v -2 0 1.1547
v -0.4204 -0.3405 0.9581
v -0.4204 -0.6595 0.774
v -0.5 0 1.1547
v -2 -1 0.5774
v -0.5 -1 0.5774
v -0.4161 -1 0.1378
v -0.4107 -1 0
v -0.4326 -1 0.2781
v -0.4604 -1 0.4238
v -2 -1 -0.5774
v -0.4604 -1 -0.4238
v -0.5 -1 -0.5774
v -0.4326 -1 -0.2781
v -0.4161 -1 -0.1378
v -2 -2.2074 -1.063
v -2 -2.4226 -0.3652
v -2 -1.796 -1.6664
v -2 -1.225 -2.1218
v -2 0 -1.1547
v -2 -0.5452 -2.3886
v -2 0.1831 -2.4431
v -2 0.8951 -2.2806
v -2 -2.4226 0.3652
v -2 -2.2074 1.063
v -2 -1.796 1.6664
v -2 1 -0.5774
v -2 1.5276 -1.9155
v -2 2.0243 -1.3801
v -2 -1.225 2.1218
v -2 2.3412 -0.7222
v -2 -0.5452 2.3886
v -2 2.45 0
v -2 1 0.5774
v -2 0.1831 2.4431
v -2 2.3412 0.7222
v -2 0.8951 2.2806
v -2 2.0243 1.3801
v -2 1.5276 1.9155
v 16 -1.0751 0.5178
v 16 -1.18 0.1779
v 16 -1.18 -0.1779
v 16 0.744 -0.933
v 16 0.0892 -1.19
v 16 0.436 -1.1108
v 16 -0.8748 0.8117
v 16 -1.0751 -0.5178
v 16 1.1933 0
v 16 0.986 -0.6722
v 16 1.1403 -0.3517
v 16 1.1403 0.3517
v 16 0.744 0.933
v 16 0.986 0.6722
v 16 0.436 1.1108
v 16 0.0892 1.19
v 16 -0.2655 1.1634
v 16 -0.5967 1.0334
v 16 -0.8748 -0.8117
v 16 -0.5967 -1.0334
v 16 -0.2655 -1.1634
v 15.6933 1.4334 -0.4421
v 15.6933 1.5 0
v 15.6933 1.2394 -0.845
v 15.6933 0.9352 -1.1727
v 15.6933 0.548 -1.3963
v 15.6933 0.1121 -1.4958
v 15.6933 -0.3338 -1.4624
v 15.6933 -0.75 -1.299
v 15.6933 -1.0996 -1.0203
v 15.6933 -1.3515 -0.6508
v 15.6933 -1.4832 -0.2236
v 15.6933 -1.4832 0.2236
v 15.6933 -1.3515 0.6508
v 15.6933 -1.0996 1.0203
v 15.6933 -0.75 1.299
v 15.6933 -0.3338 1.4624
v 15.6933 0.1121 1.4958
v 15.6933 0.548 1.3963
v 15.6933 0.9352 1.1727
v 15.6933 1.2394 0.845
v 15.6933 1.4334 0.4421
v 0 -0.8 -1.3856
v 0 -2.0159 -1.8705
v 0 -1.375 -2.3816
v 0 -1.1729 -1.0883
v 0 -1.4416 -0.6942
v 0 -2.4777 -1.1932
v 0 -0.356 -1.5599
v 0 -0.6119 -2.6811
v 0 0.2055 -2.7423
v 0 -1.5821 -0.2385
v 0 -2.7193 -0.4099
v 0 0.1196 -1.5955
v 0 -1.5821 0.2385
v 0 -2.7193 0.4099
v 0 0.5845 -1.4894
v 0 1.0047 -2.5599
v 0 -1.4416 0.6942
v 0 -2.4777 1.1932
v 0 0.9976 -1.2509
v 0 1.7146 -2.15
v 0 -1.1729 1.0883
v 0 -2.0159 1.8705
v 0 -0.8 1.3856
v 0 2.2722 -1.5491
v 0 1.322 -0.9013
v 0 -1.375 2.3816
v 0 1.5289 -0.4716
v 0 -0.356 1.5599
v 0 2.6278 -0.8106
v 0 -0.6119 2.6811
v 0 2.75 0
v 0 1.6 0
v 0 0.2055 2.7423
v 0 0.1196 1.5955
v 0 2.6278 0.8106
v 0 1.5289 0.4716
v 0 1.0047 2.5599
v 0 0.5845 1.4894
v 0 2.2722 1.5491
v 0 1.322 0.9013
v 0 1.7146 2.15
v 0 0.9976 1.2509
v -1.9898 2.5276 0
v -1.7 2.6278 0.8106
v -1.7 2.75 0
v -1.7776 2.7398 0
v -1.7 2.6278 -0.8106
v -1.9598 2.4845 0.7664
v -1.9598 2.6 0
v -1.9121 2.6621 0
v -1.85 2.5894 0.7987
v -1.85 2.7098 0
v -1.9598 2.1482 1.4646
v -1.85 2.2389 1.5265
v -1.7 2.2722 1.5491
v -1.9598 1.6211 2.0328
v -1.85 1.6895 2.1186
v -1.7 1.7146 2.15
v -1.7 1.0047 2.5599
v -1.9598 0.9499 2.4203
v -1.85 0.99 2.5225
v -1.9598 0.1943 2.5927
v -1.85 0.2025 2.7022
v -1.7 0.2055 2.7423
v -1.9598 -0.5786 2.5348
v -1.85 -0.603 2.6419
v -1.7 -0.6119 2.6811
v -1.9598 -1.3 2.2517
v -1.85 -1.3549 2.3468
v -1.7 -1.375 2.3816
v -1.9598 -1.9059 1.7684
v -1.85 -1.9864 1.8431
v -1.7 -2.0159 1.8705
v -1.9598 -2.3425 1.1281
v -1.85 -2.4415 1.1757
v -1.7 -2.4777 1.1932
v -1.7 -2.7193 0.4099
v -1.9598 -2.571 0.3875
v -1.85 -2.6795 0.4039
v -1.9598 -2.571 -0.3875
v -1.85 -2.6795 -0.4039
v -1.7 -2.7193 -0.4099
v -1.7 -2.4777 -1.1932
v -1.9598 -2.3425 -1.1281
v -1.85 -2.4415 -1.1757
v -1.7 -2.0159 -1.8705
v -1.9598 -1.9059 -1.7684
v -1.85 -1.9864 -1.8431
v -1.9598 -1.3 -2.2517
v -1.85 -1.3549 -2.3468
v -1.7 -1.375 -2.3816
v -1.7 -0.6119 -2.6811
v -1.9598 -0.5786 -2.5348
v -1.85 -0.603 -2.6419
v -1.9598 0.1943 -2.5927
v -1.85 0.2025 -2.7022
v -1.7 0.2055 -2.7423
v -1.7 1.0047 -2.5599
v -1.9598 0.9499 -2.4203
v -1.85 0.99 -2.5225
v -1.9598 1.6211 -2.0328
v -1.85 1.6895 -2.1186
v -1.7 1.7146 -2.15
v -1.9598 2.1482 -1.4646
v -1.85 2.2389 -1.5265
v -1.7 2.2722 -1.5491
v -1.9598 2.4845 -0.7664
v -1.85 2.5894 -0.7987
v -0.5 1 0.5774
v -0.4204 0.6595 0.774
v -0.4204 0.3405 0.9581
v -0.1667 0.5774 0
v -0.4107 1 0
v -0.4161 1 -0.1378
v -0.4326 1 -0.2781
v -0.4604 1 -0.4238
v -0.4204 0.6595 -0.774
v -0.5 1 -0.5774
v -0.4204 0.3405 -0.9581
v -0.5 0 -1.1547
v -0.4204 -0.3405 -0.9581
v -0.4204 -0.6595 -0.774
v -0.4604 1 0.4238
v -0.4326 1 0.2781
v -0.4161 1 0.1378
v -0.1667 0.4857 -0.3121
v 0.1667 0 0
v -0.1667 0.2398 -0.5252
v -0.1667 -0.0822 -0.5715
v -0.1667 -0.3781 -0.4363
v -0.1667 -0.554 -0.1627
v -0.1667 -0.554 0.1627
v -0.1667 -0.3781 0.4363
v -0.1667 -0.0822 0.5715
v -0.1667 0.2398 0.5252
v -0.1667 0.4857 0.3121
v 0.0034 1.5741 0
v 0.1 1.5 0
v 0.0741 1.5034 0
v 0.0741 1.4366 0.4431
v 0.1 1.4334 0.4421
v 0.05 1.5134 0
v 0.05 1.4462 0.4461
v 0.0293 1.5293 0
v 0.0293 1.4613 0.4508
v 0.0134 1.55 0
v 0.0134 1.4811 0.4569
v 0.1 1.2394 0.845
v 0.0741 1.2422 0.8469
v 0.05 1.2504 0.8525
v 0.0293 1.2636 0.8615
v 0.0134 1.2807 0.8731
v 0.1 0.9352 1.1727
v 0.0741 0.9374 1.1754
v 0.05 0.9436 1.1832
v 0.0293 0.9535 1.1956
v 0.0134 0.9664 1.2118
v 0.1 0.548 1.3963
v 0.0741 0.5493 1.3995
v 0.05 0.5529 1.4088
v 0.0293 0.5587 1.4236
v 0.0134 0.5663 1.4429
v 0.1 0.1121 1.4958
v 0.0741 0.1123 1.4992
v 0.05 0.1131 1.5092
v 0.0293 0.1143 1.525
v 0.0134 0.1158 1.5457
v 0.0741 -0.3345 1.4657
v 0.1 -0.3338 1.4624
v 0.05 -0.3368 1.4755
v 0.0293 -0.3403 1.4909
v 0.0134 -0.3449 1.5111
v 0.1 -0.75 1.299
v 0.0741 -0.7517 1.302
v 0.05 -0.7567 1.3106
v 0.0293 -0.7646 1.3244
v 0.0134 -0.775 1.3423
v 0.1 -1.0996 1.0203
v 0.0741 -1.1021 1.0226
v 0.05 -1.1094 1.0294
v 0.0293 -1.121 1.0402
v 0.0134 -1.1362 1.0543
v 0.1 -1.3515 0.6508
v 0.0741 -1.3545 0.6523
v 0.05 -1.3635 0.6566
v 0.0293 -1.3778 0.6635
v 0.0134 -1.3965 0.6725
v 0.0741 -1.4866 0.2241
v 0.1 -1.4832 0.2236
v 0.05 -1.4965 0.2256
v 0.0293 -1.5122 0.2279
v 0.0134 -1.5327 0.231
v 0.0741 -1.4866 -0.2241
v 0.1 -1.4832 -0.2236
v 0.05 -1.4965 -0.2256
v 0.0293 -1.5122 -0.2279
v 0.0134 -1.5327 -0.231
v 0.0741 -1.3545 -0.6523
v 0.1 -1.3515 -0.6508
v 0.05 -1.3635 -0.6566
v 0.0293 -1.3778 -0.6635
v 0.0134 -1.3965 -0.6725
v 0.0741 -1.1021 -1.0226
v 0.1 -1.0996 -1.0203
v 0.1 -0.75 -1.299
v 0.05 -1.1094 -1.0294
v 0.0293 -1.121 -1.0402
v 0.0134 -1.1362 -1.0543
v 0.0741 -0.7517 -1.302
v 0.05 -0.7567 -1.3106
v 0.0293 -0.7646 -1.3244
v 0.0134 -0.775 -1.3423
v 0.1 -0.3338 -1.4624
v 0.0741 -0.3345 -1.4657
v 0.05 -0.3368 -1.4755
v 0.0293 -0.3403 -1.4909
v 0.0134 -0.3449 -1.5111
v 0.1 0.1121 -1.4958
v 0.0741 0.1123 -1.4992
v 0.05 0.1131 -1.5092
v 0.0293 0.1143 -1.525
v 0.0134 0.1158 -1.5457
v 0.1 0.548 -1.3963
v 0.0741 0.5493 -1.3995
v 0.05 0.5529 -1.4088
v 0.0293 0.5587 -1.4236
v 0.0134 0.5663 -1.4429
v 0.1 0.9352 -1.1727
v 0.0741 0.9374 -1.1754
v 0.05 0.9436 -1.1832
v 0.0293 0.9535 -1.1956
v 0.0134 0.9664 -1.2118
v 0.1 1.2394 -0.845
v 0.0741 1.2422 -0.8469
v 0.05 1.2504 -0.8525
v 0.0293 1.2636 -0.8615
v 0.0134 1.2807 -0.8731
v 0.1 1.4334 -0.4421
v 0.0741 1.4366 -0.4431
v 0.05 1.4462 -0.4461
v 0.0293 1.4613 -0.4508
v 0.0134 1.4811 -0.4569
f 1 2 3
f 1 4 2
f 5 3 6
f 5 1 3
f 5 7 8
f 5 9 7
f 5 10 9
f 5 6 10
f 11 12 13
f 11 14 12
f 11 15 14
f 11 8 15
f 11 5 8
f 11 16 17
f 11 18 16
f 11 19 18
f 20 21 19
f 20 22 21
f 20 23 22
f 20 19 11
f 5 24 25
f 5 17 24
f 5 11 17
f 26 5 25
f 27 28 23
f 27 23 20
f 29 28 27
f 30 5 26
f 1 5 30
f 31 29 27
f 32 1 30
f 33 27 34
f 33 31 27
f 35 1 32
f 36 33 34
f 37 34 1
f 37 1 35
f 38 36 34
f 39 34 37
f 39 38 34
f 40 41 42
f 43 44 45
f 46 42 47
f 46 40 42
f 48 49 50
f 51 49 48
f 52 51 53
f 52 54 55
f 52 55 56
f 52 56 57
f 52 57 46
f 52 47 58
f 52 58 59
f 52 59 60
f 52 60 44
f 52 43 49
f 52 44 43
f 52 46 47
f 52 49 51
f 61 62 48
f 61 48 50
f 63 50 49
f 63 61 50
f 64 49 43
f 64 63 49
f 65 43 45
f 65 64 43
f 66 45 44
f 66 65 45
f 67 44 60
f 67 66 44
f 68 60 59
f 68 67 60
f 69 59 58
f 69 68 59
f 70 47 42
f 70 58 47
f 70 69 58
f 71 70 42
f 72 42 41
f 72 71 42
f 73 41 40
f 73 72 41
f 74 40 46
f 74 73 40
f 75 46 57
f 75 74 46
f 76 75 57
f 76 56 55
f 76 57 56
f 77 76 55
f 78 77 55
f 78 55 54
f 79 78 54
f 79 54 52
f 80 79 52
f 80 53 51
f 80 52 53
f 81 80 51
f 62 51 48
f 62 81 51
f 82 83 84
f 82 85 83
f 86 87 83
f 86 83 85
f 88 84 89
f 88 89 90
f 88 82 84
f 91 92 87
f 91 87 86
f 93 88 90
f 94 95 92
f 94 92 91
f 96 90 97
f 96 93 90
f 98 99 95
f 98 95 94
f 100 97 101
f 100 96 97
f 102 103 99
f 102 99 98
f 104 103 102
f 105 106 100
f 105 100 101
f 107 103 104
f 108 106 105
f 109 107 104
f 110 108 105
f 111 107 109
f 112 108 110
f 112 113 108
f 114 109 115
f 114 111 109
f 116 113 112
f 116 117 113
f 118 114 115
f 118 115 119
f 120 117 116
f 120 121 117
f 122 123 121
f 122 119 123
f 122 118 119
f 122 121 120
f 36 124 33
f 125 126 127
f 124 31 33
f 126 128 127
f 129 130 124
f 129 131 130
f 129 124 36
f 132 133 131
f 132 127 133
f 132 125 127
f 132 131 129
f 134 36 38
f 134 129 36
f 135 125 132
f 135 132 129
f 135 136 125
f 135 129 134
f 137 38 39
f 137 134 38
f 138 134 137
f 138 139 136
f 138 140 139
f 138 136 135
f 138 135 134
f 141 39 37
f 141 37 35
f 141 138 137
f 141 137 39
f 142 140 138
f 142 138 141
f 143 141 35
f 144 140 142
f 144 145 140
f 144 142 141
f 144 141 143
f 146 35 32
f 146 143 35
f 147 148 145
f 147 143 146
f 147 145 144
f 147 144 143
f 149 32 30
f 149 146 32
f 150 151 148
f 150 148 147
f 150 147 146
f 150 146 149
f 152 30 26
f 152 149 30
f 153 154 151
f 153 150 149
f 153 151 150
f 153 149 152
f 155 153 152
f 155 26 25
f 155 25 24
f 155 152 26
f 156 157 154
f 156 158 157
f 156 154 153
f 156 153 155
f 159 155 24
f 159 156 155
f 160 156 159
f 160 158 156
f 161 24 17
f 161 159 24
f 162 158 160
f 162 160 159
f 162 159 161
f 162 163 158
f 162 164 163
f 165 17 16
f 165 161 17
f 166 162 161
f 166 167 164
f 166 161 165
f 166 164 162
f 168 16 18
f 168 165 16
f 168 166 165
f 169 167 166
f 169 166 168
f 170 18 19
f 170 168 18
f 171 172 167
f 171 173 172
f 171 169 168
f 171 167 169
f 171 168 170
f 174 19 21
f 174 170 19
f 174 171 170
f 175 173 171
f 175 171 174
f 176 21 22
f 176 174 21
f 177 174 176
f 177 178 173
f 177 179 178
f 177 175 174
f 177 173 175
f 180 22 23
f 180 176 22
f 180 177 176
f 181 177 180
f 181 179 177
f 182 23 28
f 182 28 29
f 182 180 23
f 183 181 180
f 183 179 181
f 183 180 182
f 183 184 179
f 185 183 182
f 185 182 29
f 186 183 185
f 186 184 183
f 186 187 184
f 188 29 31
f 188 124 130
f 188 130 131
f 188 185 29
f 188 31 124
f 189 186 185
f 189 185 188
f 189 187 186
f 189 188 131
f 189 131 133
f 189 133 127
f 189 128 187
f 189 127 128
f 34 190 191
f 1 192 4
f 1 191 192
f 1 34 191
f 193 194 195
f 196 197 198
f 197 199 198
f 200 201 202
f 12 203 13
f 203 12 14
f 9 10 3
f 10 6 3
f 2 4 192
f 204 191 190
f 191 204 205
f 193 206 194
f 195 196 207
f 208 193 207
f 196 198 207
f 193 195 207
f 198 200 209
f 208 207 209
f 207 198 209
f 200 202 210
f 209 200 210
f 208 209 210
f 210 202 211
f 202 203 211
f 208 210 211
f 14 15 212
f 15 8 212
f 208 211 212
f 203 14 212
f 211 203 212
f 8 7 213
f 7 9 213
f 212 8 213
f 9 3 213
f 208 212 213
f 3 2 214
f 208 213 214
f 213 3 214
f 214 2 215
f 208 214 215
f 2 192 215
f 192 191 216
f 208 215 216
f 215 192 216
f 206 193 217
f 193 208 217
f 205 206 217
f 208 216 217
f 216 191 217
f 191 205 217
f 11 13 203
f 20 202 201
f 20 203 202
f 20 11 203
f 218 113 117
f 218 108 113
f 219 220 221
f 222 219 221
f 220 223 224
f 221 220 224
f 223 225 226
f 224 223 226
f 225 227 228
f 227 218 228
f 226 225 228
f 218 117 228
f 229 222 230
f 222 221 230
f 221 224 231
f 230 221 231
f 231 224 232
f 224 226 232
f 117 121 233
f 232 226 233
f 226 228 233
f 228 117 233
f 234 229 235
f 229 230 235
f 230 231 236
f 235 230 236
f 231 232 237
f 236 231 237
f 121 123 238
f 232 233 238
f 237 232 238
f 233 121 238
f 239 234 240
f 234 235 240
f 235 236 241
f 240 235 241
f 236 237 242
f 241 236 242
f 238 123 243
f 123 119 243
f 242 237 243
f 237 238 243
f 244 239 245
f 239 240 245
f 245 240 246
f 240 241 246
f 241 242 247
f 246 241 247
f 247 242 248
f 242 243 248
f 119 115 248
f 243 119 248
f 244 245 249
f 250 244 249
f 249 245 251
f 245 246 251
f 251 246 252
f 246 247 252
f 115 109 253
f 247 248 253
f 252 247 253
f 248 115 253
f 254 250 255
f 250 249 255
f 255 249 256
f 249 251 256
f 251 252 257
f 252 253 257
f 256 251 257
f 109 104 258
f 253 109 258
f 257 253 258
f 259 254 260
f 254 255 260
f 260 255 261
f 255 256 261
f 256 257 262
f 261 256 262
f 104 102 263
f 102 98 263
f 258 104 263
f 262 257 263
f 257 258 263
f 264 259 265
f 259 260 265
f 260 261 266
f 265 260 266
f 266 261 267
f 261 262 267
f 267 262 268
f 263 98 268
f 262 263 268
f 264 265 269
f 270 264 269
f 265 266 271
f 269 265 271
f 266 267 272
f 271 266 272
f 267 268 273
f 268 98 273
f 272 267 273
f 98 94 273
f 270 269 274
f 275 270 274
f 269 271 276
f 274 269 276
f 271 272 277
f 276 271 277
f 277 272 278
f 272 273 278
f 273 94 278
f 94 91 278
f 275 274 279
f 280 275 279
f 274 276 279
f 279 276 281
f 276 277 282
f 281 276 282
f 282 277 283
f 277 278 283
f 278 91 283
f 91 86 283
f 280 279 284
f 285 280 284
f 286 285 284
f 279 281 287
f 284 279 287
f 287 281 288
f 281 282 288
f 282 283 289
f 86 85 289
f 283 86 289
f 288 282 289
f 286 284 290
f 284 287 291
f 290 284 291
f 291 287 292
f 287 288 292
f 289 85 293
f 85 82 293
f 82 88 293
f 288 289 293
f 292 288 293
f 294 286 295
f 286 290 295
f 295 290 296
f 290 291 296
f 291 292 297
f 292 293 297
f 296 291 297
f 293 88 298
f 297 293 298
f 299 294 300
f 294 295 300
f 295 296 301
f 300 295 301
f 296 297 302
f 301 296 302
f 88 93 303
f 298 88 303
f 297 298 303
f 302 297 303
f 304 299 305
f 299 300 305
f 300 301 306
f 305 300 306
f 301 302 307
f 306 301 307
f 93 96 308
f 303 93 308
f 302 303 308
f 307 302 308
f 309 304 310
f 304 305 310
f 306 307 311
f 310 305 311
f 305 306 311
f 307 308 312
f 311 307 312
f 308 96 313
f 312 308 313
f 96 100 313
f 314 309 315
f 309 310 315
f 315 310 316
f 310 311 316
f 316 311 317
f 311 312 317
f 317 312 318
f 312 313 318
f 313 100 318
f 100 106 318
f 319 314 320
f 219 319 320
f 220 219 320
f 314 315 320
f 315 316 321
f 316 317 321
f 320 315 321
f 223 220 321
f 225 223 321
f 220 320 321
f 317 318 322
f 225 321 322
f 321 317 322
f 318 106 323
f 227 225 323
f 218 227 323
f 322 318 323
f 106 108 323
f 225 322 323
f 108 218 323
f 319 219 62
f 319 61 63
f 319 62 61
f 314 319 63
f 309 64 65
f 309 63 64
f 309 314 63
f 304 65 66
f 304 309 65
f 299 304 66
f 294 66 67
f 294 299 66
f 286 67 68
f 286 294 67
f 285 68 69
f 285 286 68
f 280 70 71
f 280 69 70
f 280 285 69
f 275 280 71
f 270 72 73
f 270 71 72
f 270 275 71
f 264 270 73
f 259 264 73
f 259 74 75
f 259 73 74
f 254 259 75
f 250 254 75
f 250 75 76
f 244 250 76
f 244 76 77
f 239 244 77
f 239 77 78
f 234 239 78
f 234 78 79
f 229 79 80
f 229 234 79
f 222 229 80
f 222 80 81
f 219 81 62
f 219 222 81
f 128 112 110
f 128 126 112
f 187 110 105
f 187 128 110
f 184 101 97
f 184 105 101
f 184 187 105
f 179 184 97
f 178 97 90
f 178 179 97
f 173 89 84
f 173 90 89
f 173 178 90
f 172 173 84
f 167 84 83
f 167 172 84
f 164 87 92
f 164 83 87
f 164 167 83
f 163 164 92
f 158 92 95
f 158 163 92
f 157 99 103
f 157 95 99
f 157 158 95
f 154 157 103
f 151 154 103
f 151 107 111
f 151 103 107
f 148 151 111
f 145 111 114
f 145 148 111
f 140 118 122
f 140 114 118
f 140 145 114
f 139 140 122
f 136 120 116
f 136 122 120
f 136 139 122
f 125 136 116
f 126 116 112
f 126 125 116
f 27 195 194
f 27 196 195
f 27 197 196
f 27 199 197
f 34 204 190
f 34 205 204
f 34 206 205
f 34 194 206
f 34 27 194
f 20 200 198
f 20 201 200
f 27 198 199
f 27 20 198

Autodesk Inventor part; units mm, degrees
ref_plane "YZ Plane" through (0, 0, 0) normal (1, 0, 0) x (0, 1, 0)
ref_plane "XZ Plane" through (0, 0, 0) normal (0, 1, 0) x (-1, 0, 0)
sketch "Skizze1" plane through (0, 0, 0) normal (0, 0, 1) x (1, 0, 0)
  line L0 (0.1667, 0) -> (16, 0)
  line L1 (16, 0) -> (16, 1.5)
  line L2 (16, 1.5) -> (1.5, 1.5)
  line L3 (1.5, 1.5) -> (1.1932, 1.5)
  line L4 (1.1932, 1.5) -> (0, 1.5)
  line L5 (0, 1.5) -> (0, 2.75)
  line L6 (0, 2.75) -> (-2, 2.75)
  line L7 (-2, 2.75) -> (-2, 1.1547)
  line L8 (-2, 1.1547) -> (-0.5, 1.1547)
  line L9 (-0.5, 1.1547) -> (0.1667, 0)
  line L10 (-5.6, 0) -> (19.6, 0) projected
  line L11 (0, -0.55) -> (0, 3.3) projected
  line L12 (1.5, 1.5) -> (0, 1.5) construction
  dimension "d1" = 14.5
  dimension "d2" = 0.3068
  dimension "d3" = 2
  dimension "d4" = 1.5
  dimension "d5" = 60
  dimension "d6" = 3
  dimension "d7" = 3
  dimension "d8" = 2.3094
  dimension "d9" = 5.5
  dimension "d26" = 16
revolve "Körper" add sketch "Skizze1" angle 360 about axis through (0.1667, 0, 0) along (1, 0, 0) contours L9 L11 L4 L3 L2 L1 L0 | L9 L8 L7 L6 L5 L11
sketch "Skizze2" plane through (-2, 0, 0) normal (-1, 0, 0) x (0, 0, 1)
  circle A0 centre (0, 0) radius 1.1547 projected
  line L0 (0, -3.85) -> (0, 3.85) projected
  line L1 (-3.85, 0) -> (3.85, 0) projected
  line L2 (1.1547, 0) -> (0.5774, -1)
  line L3 (0.5774, -1) -> (-0.5774, -1)
  line L4 (-0.5774, -1) -> (-1.1547, 0)
  line L5 (-1.1547, 0) -> (-0.5774, 1)
  line L6 (-0.5774, 1) -> (0.5774, 1)
  line L7 (0.5774, 1) -> (1.1547, 0)
  point P0 (0, 0)
extrude "Loch" add sketch "Skizze2" against normal up to next contours L7 A0 | A0 L2 | L6 L0 A0 | A0 L0 L3 | L0 L6 A0 | A0 L3 L0 | L4 A0 | A0 L5
fillet "Rundung1" radius 0.3 1 edges at (-2, -2.75, 0)
thread "Gewinde" size "M3x0.5" class "6g" standard "ISO Metric profile" length 14.5
chamfer "Fase1" distance 0.3067 distance2 0.3067 1 edges at (16, -1.5, 0) measured on face at (16, -0.4645, -0.4115)
ref_plane "Work Plane1" through (29, 0, 0) normal (0, -1, 0) x (1, 0, 0)
fillet "Fillet2" radius 0.1 1 edges at (0, -1.5, 0)
equation "\"d1\" = GEL"
equation "\"d3\" = KOH"
equation "\"d4\" = INTI"
equation "\"d6\" = GD"
equation "\"d7\" = BDM"
equation "\"d8\" = 1.1547 * SW"
equation "\"d9\" = KOD"
equation "\"d26\" = NLG"
equation "\"d30\" = R"
equation "\"d17\" = RR"
equation "\"d13\" = GEL"
equation "\"d15\" = -0.5 * SPD + 0.5 * GD"
equation "\"d16\" = GUL"
equation "\"GD\" = NND"
equation "\"NLG\" = 16"
equation "\"GEL\" = 14.5"
equation "\"KOD\" = 5.5"
equation "\"KOH\" = 2"
equation "\"INTI\" = 1.5"
equation "\"GAL\" = 0.61345 * PTC"
equation "\"GUL\" = 0.61345 * PTC"
equation "\"BDM\" = NND"
equation "\"SW\" = 2"
equation "\"RR\" = 0.3"
equation "\"SPD\" = NND - 1.2269 * PTC"
equation "\"R\" = 0.1"
equation "\"TOA\" = 30deg"
equation "\"GD1\" = THREADDIA - 1.2269 * PTC"
equation "\"THREADDIA\" = 3"
equation "\"FAWI\" = 45deg"
equation "\"ANG\" = 120deg"
equation "\"PTC\" = 0.5"
equation "\"NND\" = 3"
equation "\"E0\" = 1.155 * SW"
properties part number "DIN 7984 - M3 x 16" material "Stahl, weich"
